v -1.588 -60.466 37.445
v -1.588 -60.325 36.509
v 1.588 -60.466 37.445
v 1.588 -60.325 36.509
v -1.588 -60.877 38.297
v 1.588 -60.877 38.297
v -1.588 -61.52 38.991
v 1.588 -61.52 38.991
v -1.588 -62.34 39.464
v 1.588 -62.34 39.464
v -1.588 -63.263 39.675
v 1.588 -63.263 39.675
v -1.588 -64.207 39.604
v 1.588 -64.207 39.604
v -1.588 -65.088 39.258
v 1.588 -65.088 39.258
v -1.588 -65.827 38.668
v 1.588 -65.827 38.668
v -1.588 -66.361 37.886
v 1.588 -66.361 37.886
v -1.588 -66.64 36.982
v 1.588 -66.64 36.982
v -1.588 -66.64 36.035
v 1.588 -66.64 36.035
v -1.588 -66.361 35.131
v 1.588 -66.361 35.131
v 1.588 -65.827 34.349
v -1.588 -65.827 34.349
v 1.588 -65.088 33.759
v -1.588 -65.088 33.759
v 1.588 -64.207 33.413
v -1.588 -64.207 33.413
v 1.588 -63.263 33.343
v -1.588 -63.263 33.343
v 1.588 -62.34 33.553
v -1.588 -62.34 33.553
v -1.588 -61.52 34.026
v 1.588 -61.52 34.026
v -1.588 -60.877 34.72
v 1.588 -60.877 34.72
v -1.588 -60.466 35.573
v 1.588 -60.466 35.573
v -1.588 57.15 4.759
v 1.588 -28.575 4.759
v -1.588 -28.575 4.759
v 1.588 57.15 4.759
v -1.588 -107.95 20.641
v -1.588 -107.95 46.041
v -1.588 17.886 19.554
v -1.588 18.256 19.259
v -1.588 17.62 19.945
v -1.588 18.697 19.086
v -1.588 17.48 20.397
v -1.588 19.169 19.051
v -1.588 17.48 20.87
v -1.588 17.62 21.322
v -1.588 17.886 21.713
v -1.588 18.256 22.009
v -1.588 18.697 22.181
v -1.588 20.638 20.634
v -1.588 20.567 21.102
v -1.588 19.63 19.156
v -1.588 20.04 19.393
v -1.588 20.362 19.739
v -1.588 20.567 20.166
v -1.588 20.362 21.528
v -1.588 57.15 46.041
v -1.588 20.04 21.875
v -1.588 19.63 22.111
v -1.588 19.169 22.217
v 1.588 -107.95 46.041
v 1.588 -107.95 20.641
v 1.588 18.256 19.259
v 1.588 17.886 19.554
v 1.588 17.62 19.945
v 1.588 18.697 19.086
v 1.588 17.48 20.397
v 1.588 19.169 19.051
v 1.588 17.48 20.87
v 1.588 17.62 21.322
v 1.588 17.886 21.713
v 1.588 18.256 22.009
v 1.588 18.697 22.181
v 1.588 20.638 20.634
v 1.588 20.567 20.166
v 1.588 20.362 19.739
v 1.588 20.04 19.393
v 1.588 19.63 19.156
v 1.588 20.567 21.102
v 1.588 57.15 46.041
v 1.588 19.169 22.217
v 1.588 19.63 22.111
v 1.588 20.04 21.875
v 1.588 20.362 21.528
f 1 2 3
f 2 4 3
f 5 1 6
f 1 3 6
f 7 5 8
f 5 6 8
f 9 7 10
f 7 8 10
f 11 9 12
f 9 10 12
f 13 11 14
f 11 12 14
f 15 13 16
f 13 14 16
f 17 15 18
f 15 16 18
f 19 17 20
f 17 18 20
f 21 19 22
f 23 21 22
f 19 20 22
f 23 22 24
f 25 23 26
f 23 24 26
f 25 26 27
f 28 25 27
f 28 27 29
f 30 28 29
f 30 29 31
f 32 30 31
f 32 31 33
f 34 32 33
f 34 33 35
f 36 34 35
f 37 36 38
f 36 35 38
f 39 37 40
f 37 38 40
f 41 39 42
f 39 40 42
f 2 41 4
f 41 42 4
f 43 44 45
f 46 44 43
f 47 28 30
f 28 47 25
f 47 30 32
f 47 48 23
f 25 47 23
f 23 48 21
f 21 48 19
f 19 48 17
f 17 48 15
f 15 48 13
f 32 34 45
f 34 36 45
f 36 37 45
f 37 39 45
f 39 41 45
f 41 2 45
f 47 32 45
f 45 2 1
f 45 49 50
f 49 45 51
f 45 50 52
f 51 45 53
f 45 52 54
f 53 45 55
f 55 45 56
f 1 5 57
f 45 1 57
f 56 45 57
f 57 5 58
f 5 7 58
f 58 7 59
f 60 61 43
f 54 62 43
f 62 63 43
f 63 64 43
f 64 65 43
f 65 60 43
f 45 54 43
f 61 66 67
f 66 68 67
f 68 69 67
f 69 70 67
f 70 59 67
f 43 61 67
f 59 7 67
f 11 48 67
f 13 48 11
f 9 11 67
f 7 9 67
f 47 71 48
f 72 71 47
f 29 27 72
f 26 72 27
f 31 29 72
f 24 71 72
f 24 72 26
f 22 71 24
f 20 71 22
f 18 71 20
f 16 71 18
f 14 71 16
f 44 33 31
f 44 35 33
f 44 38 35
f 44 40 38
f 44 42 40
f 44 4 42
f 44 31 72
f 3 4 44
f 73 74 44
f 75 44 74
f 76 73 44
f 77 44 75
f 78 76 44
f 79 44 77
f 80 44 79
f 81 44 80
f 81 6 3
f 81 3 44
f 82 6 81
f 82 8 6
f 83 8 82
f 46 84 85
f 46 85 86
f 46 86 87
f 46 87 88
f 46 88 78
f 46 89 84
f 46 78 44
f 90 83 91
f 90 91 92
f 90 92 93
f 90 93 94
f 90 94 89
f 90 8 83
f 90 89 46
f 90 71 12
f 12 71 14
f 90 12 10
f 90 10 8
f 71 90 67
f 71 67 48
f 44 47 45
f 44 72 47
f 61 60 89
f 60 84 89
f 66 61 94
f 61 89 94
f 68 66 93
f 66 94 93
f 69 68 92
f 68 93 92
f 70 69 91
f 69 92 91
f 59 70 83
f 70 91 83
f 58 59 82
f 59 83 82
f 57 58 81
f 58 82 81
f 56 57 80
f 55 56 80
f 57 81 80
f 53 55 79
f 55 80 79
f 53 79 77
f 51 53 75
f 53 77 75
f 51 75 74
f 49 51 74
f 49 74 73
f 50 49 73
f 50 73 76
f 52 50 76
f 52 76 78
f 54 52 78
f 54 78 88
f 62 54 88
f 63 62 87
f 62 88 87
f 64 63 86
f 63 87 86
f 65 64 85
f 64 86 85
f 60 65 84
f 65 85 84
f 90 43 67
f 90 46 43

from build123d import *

# Parameters (mm, degrees)
F3_DEPTH = 1.5875
F1_R     = 1.5875
F1_R_2   = 3.175
F4_DEPTH = 12.7


with BuildPart() as f3:
    # F0 (on Right) → F3 (new body, symmetric)
    with BuildSketch(Plane.YZ):
        Polygon((57.15, 4.75869), (57.15, 46.04131), (-107.95, 46.04131), (-107.95, 20.64131), (-28.575, 4.75869), align=None)
    extrude(amount=F3_DEPTH, both=True)

    # F1 (on Right) → F4 (cut, symmetric)
    with BuildSketch(Plane.YZ):
        with Locations((19.05, 20.63369)):
            Circle(F1_R)
        with Locations((-63.5, 36.50869)):
            Circle(F1_R_2)
    extrude(amount=F4_DEPTH, both=True, mode=Mode.SUBTRACT)


solid = f3.part
